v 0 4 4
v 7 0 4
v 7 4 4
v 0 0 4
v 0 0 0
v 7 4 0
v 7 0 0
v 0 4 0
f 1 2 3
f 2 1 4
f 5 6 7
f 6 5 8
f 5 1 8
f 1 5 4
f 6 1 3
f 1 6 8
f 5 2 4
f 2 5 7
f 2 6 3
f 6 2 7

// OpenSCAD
union() {
  cube([4, 4, 4]);
  translate([3, 0, 0]) cube([4, 4, 4]);
}
